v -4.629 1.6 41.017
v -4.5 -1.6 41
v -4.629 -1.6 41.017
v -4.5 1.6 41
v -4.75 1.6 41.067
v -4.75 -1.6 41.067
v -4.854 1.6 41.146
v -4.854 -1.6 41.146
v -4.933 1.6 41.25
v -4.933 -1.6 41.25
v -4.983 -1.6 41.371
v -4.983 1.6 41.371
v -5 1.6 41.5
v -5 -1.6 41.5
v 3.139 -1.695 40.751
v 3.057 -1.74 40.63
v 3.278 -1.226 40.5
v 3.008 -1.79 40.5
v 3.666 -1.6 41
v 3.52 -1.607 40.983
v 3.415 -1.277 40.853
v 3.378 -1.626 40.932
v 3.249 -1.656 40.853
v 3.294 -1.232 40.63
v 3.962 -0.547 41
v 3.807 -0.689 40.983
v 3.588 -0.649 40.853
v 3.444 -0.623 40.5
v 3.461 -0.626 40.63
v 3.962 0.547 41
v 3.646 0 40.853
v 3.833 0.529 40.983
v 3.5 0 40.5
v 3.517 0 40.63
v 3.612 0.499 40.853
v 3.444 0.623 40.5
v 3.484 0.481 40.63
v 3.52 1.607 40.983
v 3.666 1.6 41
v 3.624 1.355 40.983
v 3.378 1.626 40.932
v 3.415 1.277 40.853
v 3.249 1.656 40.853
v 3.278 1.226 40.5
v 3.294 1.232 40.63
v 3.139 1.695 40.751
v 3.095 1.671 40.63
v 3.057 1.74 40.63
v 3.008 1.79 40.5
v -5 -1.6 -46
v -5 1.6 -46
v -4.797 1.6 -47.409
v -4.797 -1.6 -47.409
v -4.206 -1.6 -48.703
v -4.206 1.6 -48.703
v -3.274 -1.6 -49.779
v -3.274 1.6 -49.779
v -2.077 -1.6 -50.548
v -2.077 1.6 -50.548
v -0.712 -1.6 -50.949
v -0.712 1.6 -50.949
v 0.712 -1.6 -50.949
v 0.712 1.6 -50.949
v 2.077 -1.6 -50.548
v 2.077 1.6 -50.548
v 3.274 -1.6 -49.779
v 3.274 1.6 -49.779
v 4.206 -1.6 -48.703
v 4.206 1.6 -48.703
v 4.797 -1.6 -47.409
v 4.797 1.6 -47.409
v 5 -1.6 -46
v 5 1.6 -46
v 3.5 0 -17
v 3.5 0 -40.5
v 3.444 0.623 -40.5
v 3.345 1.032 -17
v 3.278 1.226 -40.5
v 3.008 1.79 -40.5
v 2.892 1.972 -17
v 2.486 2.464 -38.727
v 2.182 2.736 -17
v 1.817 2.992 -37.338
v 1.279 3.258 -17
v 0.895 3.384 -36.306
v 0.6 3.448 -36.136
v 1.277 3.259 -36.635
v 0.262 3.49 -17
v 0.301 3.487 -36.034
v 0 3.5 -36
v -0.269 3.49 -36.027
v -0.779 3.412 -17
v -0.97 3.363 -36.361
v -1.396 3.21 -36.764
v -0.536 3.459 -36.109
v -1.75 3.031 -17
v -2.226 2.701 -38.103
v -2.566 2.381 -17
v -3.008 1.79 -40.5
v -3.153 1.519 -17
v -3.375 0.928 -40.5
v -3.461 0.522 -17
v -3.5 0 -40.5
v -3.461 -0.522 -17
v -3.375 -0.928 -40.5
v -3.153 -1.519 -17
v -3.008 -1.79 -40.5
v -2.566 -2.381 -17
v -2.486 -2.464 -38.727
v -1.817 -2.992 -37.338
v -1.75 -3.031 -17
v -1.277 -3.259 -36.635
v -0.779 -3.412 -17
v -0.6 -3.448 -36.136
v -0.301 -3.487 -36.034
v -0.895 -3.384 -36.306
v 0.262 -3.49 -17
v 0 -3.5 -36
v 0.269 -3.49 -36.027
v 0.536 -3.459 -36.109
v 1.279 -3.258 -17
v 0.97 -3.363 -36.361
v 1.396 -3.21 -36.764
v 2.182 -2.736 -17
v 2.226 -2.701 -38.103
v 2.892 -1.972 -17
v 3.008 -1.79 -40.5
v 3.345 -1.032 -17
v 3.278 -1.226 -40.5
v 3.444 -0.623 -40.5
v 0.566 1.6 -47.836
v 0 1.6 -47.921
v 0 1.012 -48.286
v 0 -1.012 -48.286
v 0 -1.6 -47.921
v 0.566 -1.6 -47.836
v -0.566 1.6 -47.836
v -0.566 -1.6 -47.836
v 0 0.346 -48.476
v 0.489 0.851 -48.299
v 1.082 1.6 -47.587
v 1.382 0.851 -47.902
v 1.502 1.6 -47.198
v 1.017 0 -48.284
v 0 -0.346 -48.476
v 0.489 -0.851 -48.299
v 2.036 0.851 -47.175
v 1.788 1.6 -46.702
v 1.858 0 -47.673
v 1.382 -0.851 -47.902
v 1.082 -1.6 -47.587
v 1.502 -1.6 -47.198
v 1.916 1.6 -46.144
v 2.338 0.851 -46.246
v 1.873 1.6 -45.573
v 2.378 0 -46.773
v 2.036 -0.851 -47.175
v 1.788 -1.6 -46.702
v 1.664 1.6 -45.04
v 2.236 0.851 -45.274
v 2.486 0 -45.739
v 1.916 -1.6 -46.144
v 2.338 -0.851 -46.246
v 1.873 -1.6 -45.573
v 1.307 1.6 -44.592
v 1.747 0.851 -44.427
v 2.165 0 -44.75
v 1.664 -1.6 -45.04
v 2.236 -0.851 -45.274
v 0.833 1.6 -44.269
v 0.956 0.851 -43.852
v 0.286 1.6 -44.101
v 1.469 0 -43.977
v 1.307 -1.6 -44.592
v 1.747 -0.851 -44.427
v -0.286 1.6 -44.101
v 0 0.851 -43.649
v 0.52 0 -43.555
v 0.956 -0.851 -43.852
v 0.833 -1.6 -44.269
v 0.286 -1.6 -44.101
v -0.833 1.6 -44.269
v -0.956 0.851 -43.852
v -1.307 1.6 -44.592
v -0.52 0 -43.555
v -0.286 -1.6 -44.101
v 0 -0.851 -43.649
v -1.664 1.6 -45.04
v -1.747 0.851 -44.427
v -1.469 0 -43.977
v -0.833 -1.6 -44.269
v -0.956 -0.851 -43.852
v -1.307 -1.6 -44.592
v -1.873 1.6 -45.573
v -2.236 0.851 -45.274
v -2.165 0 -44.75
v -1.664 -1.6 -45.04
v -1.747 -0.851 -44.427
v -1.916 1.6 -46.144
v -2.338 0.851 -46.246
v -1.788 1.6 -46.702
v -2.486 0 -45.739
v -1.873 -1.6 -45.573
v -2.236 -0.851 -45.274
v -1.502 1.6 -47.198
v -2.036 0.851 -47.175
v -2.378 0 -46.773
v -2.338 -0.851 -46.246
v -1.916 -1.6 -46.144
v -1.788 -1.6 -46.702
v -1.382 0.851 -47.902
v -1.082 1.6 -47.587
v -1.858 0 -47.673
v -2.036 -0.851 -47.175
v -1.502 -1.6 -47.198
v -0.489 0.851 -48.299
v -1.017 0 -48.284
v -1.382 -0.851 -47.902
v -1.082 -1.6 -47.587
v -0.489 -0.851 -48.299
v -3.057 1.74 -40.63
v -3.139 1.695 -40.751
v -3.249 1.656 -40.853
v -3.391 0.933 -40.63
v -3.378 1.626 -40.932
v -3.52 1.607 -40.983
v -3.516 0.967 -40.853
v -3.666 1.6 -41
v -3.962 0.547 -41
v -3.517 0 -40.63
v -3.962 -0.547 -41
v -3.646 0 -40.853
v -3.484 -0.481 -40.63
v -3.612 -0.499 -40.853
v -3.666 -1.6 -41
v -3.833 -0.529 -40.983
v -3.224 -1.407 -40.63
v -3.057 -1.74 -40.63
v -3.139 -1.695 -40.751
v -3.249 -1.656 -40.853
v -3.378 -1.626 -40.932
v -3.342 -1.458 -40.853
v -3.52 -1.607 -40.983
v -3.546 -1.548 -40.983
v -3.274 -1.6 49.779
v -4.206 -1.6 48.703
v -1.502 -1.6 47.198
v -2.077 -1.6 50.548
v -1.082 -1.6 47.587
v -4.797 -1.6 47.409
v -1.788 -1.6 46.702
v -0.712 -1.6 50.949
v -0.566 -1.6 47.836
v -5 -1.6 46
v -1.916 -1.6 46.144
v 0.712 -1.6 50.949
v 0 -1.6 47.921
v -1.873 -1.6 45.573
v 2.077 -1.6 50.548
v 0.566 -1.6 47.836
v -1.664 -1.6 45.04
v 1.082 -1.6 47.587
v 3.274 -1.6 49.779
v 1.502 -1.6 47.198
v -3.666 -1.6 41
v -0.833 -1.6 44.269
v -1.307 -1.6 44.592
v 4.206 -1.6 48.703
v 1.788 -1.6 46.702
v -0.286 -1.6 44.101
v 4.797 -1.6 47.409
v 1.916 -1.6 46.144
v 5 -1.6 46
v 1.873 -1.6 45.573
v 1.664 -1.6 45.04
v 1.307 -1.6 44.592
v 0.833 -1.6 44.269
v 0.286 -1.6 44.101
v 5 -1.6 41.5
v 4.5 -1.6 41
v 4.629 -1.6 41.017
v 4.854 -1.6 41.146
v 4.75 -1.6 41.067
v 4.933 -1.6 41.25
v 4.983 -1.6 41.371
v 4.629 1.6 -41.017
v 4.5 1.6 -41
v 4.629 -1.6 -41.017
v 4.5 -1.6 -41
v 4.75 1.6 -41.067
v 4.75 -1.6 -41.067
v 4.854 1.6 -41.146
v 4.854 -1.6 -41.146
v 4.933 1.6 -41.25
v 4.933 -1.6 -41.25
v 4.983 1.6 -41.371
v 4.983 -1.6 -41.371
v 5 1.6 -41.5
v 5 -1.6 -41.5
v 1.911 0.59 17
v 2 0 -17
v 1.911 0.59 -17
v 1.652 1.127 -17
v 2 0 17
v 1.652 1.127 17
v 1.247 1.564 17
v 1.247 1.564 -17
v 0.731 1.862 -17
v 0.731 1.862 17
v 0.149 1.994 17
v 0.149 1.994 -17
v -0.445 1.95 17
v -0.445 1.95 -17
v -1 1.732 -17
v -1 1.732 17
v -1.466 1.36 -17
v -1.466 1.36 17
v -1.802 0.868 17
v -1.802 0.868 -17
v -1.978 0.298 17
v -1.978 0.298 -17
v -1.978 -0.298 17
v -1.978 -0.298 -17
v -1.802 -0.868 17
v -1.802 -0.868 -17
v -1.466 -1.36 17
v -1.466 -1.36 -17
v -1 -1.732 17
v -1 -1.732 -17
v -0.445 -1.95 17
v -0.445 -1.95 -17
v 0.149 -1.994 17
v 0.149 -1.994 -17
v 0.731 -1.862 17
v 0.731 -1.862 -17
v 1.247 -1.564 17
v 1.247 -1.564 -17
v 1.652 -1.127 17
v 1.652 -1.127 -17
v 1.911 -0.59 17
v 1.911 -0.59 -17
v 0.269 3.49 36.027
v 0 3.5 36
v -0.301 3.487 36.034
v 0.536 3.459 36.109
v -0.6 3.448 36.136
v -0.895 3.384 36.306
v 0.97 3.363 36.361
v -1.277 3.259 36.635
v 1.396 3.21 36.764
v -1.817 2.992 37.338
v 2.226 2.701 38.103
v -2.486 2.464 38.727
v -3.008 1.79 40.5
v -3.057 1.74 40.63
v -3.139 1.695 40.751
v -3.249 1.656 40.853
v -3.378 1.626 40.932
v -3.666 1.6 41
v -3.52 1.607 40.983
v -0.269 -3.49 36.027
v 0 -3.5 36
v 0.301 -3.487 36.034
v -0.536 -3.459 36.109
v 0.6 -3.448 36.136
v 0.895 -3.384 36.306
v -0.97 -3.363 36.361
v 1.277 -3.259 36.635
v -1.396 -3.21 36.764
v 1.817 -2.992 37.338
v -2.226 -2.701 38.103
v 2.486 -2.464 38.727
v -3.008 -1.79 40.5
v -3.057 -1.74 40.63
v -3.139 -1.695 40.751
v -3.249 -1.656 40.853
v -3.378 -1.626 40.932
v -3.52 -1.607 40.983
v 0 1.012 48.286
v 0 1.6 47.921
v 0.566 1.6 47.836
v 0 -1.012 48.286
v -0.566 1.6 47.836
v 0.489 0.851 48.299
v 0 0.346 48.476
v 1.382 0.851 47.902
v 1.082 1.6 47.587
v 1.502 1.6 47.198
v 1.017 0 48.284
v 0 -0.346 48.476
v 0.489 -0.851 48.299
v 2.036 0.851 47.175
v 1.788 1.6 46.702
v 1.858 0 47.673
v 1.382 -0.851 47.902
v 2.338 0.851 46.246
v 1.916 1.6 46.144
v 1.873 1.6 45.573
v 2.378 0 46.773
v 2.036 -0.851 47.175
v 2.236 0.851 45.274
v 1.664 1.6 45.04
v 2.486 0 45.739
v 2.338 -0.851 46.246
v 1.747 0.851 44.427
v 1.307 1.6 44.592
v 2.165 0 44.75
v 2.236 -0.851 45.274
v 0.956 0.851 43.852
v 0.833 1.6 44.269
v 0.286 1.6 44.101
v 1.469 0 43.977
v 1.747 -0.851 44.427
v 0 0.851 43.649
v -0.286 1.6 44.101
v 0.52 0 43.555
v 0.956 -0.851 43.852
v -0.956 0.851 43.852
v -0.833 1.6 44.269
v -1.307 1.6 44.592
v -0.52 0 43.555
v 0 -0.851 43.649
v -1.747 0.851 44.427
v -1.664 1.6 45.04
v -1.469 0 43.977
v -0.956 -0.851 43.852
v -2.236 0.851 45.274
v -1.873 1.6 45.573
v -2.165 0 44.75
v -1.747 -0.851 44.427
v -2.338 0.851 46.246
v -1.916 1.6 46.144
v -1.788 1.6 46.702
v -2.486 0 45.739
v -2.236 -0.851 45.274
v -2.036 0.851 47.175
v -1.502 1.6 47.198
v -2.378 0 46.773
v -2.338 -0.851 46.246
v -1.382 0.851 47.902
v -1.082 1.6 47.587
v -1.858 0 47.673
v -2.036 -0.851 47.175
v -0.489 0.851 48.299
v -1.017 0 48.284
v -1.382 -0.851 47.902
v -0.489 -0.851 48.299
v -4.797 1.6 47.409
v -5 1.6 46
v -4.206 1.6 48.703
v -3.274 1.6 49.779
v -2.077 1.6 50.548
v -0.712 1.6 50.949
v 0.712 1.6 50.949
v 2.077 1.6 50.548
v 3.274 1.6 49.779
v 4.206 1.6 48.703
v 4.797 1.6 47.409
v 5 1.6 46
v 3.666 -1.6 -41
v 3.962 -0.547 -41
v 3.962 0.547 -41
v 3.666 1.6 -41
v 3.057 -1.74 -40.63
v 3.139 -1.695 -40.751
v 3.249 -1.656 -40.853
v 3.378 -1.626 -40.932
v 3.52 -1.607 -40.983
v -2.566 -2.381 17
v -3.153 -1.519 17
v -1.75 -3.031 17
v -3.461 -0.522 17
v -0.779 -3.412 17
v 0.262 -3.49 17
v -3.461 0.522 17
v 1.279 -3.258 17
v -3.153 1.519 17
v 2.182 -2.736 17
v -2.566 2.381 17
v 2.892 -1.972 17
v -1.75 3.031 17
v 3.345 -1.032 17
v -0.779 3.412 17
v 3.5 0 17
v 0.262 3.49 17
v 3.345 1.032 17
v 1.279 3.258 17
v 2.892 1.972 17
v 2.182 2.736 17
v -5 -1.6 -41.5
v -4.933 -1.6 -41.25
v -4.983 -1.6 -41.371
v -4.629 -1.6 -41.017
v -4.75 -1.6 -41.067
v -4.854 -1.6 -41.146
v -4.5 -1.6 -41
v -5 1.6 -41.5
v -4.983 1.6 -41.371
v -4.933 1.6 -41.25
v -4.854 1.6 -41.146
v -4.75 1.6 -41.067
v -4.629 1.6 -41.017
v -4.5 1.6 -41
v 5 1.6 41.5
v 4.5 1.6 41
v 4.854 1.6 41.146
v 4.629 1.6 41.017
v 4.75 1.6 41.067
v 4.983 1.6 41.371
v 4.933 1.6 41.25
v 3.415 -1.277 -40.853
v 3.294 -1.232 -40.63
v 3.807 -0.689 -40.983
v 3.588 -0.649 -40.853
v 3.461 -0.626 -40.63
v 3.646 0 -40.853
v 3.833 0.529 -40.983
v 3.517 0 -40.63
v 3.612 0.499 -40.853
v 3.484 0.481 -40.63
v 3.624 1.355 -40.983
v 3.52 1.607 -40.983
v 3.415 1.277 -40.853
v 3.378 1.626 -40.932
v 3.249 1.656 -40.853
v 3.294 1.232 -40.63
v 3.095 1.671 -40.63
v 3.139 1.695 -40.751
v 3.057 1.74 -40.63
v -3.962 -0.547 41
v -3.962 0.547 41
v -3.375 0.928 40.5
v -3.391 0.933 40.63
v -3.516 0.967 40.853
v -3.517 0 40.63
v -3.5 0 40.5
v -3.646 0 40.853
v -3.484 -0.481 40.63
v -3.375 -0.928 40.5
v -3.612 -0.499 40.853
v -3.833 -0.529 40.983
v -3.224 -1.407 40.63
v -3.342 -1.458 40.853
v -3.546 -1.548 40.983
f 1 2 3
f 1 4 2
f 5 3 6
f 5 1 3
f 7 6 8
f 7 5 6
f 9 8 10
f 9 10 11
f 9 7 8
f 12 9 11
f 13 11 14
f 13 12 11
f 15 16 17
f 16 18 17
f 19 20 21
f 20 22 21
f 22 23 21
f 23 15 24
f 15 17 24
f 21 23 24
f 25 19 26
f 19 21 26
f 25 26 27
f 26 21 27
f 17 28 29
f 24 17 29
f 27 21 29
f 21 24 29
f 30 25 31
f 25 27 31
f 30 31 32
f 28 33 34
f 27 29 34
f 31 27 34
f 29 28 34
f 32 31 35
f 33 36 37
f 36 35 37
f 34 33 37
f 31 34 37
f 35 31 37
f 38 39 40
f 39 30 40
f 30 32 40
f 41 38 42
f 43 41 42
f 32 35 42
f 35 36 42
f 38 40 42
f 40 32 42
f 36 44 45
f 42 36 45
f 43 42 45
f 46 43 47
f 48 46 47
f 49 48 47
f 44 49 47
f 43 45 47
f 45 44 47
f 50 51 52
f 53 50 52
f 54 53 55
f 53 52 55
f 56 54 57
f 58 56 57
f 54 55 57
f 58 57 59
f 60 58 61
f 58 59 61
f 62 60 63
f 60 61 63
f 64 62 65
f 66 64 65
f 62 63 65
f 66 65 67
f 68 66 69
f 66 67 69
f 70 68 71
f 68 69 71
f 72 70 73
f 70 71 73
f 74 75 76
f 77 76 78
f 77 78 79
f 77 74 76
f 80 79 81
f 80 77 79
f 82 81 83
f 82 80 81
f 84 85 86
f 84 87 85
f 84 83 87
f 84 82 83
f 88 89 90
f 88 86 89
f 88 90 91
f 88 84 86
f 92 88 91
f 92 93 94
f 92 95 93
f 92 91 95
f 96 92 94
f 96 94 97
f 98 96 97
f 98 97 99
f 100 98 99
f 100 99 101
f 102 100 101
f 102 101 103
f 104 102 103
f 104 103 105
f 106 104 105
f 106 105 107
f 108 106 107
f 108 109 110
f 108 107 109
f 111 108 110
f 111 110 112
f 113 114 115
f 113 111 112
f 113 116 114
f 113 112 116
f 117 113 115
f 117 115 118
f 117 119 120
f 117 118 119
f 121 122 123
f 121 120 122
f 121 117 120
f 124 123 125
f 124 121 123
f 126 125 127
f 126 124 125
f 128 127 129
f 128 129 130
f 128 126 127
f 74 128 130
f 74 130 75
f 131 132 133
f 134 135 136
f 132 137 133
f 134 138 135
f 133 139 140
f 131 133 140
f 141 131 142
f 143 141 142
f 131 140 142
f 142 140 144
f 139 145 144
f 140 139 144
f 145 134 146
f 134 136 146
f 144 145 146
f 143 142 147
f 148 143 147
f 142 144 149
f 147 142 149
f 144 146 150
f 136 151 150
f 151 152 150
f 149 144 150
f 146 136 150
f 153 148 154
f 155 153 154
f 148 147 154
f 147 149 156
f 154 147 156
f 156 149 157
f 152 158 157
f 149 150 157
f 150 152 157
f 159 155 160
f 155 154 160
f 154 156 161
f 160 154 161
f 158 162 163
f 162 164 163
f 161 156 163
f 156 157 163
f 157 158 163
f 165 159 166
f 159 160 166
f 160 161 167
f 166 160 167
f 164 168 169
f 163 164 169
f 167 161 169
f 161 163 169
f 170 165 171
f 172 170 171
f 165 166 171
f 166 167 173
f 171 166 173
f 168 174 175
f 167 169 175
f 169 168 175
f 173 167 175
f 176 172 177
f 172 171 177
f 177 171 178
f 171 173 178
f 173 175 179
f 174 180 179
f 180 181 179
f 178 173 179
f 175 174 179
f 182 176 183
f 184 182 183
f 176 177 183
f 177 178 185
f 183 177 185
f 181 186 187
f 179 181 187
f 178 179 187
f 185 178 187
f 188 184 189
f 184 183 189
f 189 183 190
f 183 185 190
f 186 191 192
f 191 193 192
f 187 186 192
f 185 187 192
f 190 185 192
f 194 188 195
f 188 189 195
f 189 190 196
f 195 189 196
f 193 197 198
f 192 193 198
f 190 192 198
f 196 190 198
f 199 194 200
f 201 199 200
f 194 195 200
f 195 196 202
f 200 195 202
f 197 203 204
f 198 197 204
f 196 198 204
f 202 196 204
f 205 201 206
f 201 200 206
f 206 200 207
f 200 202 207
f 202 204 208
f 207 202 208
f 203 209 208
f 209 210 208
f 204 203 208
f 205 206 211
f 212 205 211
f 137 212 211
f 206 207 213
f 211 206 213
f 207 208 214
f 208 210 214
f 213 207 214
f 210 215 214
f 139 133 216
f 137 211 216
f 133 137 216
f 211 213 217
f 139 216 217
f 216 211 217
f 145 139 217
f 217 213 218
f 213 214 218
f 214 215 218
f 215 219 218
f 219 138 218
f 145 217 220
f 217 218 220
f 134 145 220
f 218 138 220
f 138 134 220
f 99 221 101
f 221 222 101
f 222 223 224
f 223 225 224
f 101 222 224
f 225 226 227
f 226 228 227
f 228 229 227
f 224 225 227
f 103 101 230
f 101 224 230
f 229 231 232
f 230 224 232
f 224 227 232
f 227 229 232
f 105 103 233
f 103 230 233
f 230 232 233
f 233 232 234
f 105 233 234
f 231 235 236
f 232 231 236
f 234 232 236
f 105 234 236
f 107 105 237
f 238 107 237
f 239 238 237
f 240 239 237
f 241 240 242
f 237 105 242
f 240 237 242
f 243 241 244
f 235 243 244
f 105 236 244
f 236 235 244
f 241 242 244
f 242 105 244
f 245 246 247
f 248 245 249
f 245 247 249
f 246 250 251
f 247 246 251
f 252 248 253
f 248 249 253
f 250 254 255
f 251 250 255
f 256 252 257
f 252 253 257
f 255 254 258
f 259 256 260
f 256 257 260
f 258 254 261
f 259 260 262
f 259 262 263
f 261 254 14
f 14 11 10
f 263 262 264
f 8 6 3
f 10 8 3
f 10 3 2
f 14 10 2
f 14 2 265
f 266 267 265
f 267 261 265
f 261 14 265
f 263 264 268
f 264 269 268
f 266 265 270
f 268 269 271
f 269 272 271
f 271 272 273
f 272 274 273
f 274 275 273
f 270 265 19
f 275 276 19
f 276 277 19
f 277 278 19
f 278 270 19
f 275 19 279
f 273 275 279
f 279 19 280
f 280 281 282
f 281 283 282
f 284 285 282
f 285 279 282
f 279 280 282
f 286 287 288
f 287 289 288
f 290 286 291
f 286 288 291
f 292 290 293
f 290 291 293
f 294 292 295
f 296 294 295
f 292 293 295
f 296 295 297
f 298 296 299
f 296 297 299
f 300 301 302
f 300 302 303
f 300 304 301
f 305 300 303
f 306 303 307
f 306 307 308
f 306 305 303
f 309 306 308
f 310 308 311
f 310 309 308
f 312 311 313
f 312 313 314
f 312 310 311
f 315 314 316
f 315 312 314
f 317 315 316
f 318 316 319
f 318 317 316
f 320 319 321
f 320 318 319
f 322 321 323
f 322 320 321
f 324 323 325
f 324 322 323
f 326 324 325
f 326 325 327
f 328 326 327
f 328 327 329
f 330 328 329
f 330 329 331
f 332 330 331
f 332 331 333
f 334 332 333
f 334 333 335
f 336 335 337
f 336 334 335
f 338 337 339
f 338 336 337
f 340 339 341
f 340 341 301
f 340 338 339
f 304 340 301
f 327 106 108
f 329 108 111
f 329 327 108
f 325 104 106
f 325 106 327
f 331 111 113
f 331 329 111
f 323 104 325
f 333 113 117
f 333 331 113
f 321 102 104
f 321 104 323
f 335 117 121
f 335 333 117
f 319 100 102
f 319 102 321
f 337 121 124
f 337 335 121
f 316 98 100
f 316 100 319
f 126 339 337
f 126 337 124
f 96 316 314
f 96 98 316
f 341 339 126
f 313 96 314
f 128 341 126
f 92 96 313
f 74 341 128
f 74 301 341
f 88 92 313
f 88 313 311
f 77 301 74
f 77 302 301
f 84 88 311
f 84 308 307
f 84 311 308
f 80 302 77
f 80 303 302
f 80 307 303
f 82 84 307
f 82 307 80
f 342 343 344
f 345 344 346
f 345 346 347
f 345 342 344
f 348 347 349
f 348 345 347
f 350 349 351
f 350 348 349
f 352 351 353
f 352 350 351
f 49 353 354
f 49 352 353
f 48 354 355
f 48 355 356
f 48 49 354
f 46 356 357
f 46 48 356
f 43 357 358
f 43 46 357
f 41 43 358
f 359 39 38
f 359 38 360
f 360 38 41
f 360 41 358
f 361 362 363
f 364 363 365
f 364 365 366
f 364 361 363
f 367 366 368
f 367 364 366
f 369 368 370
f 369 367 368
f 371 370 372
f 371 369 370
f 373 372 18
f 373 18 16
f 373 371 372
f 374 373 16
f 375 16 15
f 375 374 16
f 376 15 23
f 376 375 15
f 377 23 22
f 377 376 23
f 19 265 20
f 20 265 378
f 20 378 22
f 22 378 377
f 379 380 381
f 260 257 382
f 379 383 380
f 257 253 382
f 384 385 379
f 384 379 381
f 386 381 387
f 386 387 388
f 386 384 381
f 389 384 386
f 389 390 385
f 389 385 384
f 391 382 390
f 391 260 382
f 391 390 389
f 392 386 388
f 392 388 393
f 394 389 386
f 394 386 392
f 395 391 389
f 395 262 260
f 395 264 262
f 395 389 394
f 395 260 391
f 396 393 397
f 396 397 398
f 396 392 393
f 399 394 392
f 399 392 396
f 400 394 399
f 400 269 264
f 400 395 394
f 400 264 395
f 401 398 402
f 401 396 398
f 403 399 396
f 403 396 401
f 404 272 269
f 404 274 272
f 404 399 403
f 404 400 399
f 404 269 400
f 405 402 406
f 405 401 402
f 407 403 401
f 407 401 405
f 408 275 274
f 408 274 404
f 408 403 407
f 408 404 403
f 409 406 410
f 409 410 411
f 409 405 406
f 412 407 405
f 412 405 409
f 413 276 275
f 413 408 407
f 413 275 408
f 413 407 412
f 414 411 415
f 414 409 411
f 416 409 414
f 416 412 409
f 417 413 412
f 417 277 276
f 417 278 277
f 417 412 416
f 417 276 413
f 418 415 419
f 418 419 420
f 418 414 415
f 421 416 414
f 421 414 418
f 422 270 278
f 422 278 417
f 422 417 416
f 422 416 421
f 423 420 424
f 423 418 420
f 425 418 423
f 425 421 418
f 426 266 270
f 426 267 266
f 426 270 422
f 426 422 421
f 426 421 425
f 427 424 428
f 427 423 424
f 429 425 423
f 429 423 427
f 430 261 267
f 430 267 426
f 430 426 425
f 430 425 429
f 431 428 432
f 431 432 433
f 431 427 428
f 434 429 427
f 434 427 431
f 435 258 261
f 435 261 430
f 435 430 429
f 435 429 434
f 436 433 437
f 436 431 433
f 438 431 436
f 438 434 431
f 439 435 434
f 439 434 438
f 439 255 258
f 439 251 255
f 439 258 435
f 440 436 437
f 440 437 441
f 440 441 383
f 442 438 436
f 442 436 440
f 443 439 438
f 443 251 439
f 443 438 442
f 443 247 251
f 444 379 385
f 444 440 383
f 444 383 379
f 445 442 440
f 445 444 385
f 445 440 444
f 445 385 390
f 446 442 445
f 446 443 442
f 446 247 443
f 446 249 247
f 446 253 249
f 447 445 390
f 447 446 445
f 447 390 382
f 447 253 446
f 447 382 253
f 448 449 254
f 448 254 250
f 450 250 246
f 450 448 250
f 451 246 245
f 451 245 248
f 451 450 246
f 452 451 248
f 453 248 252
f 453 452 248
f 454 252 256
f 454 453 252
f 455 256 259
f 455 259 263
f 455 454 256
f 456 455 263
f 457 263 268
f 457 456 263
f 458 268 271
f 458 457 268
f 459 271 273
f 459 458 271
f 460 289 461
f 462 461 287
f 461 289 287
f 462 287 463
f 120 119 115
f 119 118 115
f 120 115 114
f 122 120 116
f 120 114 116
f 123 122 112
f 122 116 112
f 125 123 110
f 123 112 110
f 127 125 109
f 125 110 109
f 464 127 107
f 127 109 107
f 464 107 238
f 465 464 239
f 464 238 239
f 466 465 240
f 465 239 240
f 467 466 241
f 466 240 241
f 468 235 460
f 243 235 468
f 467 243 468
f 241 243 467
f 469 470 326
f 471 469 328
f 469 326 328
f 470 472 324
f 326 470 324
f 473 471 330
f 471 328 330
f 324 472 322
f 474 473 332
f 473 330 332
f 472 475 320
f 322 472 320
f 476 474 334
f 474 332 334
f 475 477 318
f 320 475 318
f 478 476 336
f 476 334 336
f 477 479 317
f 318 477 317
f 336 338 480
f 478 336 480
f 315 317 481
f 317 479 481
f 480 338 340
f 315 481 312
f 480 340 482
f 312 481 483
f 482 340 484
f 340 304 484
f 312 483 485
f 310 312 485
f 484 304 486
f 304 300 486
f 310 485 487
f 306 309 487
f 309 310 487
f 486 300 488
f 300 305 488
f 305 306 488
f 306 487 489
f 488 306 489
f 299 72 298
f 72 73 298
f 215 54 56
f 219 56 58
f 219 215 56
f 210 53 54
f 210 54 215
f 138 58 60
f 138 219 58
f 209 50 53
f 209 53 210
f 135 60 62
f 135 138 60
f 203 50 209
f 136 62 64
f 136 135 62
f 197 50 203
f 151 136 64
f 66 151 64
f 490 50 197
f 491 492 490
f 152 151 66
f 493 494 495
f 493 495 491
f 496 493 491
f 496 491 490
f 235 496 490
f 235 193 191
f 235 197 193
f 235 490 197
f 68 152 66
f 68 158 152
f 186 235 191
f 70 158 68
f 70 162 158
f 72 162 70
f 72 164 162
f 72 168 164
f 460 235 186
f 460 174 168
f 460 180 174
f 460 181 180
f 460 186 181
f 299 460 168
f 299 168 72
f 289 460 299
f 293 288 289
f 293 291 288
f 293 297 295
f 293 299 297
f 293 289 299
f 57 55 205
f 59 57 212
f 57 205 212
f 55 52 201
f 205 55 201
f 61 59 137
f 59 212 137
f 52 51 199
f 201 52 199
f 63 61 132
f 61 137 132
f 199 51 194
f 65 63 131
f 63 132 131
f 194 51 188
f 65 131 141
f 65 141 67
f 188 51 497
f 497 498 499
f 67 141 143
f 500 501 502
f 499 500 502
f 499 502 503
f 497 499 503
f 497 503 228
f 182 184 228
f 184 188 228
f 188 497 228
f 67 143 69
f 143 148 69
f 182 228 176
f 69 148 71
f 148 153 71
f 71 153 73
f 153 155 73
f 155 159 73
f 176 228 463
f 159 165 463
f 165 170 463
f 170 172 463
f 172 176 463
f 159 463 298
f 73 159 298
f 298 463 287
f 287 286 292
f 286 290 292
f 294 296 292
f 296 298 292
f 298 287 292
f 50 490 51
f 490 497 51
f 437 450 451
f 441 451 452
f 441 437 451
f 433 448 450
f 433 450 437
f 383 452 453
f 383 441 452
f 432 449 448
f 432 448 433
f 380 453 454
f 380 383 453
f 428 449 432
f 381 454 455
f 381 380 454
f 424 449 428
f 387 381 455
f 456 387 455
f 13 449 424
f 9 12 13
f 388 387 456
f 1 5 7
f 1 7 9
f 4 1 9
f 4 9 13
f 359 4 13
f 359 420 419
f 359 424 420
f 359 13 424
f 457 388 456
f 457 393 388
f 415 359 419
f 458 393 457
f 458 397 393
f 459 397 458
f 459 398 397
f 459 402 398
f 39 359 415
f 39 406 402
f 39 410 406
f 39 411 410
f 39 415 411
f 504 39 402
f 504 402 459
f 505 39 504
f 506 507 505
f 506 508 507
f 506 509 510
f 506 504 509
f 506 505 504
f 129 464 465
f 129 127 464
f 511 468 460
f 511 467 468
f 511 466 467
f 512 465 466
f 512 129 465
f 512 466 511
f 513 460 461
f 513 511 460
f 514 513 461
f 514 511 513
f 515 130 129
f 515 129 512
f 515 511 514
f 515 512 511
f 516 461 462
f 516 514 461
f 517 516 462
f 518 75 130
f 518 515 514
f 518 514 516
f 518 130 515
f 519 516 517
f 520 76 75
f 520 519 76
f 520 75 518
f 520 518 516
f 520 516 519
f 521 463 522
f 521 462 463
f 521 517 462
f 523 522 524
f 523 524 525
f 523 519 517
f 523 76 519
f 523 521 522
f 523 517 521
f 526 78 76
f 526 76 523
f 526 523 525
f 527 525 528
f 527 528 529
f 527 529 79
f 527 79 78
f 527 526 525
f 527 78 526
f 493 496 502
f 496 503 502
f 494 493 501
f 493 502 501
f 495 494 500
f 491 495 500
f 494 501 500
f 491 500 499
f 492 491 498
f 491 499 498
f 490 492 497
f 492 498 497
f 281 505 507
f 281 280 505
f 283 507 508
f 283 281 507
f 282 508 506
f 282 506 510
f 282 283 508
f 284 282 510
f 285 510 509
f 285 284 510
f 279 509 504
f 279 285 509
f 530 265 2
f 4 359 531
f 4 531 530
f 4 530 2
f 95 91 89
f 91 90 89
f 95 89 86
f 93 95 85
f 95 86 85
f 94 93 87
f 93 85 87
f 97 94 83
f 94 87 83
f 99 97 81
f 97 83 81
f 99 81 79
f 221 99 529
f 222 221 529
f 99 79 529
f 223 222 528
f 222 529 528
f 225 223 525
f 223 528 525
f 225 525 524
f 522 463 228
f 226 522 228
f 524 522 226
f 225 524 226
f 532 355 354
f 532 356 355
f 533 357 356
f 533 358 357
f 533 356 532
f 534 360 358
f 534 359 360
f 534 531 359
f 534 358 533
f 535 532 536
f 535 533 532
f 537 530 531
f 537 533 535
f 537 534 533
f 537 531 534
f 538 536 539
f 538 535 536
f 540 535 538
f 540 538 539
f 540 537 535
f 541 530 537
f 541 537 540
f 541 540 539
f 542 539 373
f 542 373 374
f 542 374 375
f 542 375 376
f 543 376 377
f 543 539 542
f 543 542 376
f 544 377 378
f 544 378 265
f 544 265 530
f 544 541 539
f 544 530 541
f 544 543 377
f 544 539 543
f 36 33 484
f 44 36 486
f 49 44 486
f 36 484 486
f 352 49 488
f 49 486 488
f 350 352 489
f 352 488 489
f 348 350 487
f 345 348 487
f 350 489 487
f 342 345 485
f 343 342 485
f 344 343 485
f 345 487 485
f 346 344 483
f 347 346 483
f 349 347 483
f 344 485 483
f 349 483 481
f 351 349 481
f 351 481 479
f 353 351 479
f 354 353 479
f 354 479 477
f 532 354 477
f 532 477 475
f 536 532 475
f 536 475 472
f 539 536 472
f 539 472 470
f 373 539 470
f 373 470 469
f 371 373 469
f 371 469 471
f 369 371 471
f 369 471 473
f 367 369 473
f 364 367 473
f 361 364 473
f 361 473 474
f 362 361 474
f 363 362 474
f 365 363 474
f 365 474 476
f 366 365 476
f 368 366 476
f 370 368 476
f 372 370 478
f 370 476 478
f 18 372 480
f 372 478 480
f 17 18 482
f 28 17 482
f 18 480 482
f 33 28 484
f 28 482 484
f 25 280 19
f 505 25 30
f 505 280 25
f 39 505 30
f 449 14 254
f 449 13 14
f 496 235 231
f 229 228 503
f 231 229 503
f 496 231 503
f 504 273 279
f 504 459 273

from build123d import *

# Parameters (mm, degrees)
SKETCH1_R                  = 2
SCREW_SECTION_DEPTH        = 17
SKETCH2_R                  = 3.5
BAR_SECTION_DEPTH          = 24
MOUNT_SECTION_DEPTH        = 1.6
BAR_TAPER_DEPTH            = 6
MOUNT_FILLET_R             = 0.5
MOUNT_FILLET_OF_MIRROR_2_R = 0.5


with BuildPart() as part:
    # Sketch1 → Screw Section (new body)
    with BuildSketch(Plane.XY):
        Circle(SKETCH1_R)
    screw_section = extrude(amount=SCREW_SECTION_DEPTH)

    # Sketch2 → Bar Section (add)
    with BuildSketch(Plane.XY.offset(17)):
        Circle(SKETCH2_R)
    bar_section = extrude(amount=BAR_SECTION_DEPTH)

    # Sketch3 → Mount Section (add, symmetric)
    with BuildSketch(Plane(origin=(0, 0, 0), x_dir=(1, 0, 0), z_dir=(0, 1, 0))):
        with BuildLine():
            Line((5, -41), (-5, -41))
            Line((-5, -41), (-5, -46))
            ThreePointArc((-5, -46), (0, -51), (5, -46))
            Line((5, -46), (5, -41))
        make_face()
    mount_section = extrude(amount=MOUNT_SECTION_DEPTH, both=True)

    # Sketch4 → Bar Taper (cut, symmetric)
    with BuildSketch(Plane(origin=(0, 0, 0), x_dir=(0, 0, -1), z_dir=(1, 0, 0))):
        Polygon((-36, -3.5), (-41, -1.6), (-41, -3.5), align=None)
        Polygon((-36, 3.5), (-41, 1.6), (-41, 3.5), align=None)
    bar_taper = extrude(amount=BAR_TAPER_DEPTH, both=True, mode=Mode.SUBTRACT)

    # Mount Fillet
    mount_fillet_edges = [part.edges().sort_by_distance(p)[0] for p in [
        (-5, 0, 41),
        (3.401842713, -0.823083322, 41),
        (-3.5, 0, 41),
        (5, 0, 41),
    ]]
    fillet(mount_fillet_edges, radius=MOUNT_FILLET_R)

    # Sketch6 → Ball Hole (revolve, cut)
    with BuildSketch(Plane(origin=(0, 0, 0), x_dir=(0, 0, -1), z_dir=(1, 0, 0))):
        with BuildLine():
            Line((-47.920937271, -1.6), (-46, -1.6))
            Line((-46, -1.6), (-46, 1.6))
            Line((-46, 1.6), (-47.920937271, 1.6))
            ThreePointArc((-47.920937271, 1.6), (-48.5, 0), (-47.920937271, -1.6))
        make_face()
    ball_hole = revolve(axis=Axis((0, -1.6, 46), (0, 1, 0)), mode=Mode.SUBTRACT)

    # Mirror 2: Screw Section, Bar Section, Mount Section, Bar Taper, Ball Hole across Front Plane
    add(screw_section.mirror(Plane.XY))
    add(bar_section.mirror(Plane.XY))
    add(mount_section.mirror(Plane.XY))
    add(bar_taper.mirror(Plane.XY), mode=Mode.SUBTRACT)
    add(ball_hole.mirror(Plane.XY), mode=Mode.SUBTRACT)

    # Mount Fillet of Mirror 2
    mount_fillet_of_mirror_2_edges = [part.edges().sort_by_distance(p)[0] for p in [
        (-5, 0, -41),
        (3.401842713, -0.823083322, -41),
        (-3.5, 0, -41),
        (5, 0, -41),
    ]]
    fillet(mount_fillet_of_mirror_2_edges, radius=MOUNT_FILLET_OF_MIRROR_2_R)


solid = part.part
